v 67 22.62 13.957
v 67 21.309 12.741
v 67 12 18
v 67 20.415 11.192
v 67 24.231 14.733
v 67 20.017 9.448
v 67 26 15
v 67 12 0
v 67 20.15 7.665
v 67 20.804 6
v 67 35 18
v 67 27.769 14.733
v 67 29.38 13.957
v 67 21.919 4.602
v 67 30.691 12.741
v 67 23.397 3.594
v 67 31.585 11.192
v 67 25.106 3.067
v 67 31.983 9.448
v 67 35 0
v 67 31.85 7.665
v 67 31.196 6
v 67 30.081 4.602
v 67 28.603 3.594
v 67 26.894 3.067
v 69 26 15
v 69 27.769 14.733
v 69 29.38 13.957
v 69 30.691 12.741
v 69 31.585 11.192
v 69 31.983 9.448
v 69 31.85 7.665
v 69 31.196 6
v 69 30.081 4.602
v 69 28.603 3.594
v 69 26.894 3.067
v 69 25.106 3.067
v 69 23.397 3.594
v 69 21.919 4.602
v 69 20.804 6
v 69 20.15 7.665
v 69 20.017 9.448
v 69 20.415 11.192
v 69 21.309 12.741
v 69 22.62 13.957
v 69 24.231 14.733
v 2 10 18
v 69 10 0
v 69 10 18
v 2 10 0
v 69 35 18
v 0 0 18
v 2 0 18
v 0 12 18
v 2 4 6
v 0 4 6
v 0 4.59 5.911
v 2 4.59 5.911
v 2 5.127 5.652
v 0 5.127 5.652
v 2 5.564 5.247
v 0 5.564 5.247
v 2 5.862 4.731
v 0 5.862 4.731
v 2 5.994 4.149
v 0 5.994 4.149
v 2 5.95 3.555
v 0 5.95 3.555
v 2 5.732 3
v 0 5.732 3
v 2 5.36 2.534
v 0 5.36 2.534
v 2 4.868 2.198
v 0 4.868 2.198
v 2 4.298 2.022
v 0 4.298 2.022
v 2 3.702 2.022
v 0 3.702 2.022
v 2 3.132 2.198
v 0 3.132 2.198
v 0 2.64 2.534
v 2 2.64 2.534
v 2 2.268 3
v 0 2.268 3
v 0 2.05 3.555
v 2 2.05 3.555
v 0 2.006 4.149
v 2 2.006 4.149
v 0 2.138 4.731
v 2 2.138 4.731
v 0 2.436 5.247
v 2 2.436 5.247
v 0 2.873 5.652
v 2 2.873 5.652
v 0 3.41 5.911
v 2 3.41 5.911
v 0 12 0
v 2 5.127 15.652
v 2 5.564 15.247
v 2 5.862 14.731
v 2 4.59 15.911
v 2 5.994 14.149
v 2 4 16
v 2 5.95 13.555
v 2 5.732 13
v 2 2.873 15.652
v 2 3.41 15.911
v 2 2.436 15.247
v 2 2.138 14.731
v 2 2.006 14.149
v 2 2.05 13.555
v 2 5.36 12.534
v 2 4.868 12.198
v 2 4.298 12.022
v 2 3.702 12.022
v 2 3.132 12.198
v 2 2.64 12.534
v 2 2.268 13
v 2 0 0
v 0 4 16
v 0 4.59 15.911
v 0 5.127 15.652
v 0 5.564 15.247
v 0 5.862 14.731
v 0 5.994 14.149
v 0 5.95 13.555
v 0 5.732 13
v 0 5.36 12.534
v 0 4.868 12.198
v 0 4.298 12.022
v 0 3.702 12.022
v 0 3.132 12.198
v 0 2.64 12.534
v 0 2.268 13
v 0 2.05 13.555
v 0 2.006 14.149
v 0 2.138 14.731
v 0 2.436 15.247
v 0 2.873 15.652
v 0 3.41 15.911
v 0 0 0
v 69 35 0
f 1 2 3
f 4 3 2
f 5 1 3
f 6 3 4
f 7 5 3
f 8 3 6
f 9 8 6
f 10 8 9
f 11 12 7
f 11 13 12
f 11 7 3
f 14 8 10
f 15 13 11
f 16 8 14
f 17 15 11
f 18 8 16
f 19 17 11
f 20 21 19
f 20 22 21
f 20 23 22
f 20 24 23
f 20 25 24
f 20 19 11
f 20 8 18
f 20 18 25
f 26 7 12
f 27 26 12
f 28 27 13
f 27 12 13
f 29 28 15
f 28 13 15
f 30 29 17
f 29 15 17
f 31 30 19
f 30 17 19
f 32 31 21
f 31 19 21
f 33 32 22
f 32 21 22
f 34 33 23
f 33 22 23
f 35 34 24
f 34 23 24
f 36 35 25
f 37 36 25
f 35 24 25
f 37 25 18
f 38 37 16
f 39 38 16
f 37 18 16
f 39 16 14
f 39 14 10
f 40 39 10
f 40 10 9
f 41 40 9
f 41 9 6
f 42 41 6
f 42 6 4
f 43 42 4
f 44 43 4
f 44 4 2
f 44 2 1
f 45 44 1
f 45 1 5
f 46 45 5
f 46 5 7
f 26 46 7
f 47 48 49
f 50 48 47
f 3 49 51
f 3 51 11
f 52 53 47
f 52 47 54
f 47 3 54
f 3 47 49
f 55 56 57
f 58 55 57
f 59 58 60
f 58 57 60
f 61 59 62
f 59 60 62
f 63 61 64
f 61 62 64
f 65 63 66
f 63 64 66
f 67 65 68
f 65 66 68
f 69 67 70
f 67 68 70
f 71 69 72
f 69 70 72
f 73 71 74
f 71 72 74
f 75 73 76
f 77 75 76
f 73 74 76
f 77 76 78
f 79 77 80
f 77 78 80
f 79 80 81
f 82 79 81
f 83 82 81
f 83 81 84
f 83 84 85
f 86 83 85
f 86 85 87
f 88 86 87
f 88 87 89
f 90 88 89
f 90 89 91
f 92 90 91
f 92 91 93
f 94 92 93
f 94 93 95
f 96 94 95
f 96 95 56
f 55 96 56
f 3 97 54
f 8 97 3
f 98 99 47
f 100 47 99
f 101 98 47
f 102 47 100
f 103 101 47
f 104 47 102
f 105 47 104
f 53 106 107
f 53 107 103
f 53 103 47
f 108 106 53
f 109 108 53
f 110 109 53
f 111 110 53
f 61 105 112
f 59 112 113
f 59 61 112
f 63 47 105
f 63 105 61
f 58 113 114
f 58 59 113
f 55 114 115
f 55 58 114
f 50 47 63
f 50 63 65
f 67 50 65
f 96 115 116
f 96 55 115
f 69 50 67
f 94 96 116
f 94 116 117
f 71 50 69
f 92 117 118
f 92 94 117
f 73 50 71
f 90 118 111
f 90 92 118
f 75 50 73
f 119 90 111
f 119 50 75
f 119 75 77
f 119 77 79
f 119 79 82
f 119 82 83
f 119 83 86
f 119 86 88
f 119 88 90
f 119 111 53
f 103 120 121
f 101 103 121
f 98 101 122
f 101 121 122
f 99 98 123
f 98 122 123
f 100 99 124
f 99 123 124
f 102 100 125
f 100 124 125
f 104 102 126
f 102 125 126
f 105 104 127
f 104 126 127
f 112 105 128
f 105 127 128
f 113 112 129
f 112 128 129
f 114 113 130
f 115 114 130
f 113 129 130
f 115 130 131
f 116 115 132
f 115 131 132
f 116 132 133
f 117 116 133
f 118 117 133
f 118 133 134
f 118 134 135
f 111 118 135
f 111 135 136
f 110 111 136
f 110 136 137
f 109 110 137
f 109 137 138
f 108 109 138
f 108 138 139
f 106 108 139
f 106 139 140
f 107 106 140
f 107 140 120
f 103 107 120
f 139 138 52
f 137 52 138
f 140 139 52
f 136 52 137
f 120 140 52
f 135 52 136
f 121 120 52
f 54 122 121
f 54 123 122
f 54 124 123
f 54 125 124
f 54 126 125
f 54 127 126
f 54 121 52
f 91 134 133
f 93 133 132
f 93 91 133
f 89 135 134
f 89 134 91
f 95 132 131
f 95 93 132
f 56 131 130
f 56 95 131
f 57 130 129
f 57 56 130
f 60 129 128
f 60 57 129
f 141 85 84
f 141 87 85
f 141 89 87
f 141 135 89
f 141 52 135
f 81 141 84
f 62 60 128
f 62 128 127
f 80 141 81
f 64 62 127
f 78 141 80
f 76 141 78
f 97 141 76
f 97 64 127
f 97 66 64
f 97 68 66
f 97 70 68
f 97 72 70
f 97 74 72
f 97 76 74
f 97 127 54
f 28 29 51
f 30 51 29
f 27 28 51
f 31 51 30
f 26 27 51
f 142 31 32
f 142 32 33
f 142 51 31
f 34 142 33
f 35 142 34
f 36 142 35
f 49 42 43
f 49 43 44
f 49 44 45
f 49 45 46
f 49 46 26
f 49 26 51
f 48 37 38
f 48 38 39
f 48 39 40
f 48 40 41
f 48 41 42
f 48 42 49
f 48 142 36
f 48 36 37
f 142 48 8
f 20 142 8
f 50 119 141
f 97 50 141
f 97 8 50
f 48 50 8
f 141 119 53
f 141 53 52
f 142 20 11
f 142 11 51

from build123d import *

# Parameters (mm, degrees)
BOSS_EXTRUDE1_DEPTH = 18
CUT_EXTRUDE1_REACH  = 71
SKETCH2_R           = 2
CUT_EXTRUDE2_REACH  = 4
SKETCH3_R           = 6


with BuildPart() as part:
    # Sketch1 → Boss-Extrude1 (new body)
    with BuildSketch(Plane.XY):
        Polygon((0, 0), (0, 12), (67, 12), (67, 35), (69, 35), (69, 10), (2, 10), (2, 0), align=None)
    extrude(amount=BOSS_EXTRUDE1_DEPTH)

    # Sketch2 → Cut-Extrude1 (cut, up to next)
    with BuildSketch(Plane.ZY, mode=Mode.PRIVATE) as cut_extrude1_sk1:
        with Locations((4, 4)):
            Circle(SKETCH2_R)
    cut_extrude1_tool1 = extrude(cut_extrude1_sk1.sketch, amount=-CUT_EXTRUDE1_REACH, mode=Mode.PRIVATE) & part.part
    add(cut_extrude1_tool1.solids().sort_by_distance((0, 4, 4))[0], mode=Mode.SUBTRACT)
    # Sketch2 → Cut-Extrude1 (cut, up to next)
    with BuildSketch(Plane.ZY, mode=Mode.PRIVATE) as cut_extrude1_sk2:
        with Locations((14, 4)):
            Circle(SKETCH2_R)
    cut_extrude1_tool2 = extrude(cut_extrude1_sk2.sketch, amount=-CUT_EXTRUDE1_REACH, mode=Mode.PRIVATE) & part.part
    add(cut_extrude1_tool2.solids().sort_by_distance((0, 4, 14))[0], mode=Mode.SUBTRACT)

    # Sketch3 → Cut-Extrude2 (cut, up to next)
    with BuildSketch(Plane.ZY.offset(-67), mode=Mode.PRIVATE) as cut_extrude2_sk1:
        with Locations((9, 26)):
            Circle(SKETCH3_R)
    cut_extrude2_tool1 = extrude(cut_extrude2_sk1.sketch, amount=-CUT_EXTRUDE2_REACH, mode=Mode.PRIVATE) & part.part
    add(cut_extrude2_tool1.solids().sort_by_distance((67, 26, 9))[0], mode=Mode.SUBTRACT)


solid = part.part
